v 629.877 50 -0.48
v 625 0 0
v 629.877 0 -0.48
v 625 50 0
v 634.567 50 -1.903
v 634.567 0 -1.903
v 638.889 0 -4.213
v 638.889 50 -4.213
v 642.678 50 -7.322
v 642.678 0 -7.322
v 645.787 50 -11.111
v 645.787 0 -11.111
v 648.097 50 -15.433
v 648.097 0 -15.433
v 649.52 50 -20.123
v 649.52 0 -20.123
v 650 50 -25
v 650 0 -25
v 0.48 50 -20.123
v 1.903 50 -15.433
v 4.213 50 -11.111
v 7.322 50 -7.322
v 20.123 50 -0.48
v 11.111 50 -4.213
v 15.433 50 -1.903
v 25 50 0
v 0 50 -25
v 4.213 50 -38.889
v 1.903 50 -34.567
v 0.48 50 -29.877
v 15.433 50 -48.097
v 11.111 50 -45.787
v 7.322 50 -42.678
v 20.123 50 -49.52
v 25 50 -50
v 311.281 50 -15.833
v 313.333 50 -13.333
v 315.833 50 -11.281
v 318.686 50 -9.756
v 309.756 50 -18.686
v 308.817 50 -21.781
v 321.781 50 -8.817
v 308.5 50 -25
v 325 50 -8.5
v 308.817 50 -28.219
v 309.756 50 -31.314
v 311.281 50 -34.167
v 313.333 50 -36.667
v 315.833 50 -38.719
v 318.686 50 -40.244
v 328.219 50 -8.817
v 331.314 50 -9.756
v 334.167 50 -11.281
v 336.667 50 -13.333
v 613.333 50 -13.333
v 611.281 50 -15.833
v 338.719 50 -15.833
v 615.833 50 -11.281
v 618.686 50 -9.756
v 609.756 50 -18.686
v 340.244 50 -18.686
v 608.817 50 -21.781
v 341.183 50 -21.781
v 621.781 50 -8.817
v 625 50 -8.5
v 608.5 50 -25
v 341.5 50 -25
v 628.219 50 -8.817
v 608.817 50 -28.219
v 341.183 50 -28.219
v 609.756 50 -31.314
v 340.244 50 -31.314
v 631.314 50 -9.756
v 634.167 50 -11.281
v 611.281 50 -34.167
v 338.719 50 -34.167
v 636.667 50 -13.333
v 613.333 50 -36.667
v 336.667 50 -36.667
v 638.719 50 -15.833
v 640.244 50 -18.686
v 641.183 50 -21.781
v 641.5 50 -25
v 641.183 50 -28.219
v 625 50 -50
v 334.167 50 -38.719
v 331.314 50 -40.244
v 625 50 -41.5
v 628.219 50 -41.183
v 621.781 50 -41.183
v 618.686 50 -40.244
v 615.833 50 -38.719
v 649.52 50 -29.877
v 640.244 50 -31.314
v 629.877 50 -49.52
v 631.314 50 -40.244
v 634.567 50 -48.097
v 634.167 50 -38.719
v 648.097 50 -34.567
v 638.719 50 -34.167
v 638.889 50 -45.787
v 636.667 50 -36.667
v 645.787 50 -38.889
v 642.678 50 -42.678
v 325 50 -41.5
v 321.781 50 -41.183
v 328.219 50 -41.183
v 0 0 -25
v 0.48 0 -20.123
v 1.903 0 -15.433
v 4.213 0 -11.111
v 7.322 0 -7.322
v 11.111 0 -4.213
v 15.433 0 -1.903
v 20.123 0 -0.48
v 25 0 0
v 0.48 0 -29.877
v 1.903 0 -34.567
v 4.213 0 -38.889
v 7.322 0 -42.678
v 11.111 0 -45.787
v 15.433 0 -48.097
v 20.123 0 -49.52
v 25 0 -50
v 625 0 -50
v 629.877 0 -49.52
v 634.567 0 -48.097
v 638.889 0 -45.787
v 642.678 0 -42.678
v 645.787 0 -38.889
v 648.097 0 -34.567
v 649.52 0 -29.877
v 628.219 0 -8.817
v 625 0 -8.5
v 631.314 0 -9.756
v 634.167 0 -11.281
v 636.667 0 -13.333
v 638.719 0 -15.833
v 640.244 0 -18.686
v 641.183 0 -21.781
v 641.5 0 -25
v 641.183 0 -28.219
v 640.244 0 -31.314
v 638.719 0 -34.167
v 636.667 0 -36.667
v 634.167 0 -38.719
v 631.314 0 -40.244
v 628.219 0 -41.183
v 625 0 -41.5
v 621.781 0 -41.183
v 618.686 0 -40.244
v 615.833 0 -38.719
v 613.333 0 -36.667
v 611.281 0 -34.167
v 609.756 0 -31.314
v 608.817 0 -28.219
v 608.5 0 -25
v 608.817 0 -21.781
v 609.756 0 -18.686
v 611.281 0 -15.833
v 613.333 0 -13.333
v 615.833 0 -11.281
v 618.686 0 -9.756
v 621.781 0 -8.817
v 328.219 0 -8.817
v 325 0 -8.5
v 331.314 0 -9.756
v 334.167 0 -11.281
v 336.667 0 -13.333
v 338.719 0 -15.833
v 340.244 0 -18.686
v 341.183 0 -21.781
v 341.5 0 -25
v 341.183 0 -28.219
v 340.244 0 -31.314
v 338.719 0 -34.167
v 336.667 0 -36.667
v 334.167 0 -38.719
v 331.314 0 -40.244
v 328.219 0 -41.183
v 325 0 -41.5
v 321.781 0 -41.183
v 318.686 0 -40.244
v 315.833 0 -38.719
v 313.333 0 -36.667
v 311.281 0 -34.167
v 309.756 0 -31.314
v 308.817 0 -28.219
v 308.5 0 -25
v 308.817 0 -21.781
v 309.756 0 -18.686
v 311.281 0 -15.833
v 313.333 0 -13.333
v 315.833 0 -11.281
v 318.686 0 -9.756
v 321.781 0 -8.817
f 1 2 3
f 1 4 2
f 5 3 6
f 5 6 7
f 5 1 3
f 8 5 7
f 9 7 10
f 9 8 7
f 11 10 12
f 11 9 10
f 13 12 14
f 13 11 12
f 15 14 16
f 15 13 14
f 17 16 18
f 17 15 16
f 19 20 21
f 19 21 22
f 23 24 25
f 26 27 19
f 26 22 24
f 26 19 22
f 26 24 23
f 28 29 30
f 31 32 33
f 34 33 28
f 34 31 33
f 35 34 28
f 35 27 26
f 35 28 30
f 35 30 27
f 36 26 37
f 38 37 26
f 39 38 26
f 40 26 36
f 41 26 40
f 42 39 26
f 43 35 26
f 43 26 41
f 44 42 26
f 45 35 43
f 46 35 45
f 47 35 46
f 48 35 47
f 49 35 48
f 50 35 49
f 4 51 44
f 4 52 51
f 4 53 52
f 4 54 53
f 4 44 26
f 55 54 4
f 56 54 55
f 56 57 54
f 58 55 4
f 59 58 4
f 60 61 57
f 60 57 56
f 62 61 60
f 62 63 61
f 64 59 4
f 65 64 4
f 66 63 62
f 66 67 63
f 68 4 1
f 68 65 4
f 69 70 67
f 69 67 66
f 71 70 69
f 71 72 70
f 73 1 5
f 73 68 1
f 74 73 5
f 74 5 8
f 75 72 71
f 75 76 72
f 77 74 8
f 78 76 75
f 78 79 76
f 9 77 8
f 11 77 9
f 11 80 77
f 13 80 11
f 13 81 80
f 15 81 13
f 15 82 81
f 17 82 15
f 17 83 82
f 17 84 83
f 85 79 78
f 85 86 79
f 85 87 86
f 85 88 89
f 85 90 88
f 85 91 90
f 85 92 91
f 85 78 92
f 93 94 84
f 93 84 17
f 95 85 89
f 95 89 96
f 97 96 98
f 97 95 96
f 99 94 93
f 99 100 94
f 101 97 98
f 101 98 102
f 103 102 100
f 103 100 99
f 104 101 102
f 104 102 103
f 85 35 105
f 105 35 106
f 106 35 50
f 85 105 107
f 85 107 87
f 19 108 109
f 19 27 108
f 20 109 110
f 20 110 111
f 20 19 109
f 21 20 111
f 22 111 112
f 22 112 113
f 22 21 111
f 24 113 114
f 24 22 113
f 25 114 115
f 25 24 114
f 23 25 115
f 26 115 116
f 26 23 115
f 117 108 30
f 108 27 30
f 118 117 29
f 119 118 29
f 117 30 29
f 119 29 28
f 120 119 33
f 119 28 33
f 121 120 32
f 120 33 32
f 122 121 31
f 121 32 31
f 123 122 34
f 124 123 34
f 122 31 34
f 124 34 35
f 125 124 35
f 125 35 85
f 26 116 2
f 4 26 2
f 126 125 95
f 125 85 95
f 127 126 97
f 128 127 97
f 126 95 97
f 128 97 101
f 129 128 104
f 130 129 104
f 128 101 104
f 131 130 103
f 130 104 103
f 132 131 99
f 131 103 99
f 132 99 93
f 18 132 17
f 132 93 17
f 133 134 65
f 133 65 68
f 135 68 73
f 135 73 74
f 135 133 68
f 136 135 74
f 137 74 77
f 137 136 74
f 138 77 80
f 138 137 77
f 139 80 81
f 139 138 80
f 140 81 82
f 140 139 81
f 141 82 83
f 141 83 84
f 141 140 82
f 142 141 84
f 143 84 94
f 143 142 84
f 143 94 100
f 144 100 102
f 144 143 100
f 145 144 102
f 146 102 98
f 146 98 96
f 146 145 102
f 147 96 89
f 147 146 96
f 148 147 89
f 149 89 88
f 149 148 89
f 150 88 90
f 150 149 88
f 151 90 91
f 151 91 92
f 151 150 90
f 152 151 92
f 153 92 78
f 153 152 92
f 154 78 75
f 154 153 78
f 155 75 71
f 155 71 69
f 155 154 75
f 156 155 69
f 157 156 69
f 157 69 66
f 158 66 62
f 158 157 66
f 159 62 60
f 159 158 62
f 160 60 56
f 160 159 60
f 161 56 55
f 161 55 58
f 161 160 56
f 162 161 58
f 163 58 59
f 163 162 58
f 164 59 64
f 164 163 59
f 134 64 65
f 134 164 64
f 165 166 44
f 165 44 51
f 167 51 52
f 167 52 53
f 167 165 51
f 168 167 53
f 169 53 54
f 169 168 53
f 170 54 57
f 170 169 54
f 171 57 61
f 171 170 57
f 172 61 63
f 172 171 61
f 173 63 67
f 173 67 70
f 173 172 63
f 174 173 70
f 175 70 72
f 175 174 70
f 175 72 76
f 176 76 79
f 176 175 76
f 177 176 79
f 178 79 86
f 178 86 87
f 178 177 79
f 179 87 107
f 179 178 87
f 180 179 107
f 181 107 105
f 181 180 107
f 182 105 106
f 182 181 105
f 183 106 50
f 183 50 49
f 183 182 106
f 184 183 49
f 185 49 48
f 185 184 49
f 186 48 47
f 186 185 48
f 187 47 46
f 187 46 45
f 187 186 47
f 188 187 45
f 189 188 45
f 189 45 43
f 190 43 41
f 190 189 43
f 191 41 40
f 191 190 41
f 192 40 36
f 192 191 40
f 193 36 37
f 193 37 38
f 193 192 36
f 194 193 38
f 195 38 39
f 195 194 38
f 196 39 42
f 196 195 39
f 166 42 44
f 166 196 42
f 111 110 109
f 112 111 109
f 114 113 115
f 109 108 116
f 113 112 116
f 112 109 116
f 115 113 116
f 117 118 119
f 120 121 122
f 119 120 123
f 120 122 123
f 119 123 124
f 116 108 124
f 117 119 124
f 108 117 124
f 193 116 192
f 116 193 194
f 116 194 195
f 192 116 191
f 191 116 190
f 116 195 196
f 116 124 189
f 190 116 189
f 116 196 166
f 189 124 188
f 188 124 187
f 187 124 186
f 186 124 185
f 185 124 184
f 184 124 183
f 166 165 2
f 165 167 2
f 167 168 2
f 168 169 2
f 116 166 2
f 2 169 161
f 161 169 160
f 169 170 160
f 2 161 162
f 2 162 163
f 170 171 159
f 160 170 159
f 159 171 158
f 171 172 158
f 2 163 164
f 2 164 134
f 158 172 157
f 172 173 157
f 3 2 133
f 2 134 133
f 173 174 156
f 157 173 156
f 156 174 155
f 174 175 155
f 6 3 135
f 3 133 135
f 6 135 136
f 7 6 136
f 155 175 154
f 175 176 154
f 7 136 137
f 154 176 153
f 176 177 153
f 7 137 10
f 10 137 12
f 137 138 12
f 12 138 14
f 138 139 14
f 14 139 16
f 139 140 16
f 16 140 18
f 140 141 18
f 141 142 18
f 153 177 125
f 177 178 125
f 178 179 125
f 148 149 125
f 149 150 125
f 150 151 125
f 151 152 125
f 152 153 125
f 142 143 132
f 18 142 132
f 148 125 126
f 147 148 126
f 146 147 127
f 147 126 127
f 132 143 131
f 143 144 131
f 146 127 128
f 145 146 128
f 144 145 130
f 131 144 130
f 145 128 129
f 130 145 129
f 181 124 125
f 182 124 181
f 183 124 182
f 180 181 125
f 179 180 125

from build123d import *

# Parameters (mm, degrees)
SKETCH_1_W      = 650
SKETCH_1_H      = 50
SKETCH_1_R      = 16.5
EXTRUDE_1_DEPTH = 50
FILLET_1_R      = 25


with BuildPart() as part:
    # 草图1 → 凸台-拉伸1 (new body)
    with BuildSketch(Plane(origin=(0, 0, 0), x_dir=(1, 0, 0), z_dir=(0, 1, 0))):
        with Locations((325, 25)):
            Rectangle(SKETCH_1_W, SKETCH_1_H)
        with Locations(Location((625, 25, 0), (0, 0, 270))):
            Circle(SKETCH_1_R, mode=Mode.SUBTRACT)
        with Locations(Location((325, 25, 0), (0, 0, 270))):
            Circle(SKETCH_1_R, mode=Mode.SUBTRACT)
    extrude(amount=EXTRUDE_1_DEPTH)

    # 圆角1
    fillet_1_edges = [part.edges().sort_by_distance(p)[0] for p in [
        (0, 25, -50),
        (0, 25, 0),
        (650, 25, -50),
        (650, 25, 0),
    ]]
    fillet(fillet_1_edges, radius=FILLET_1_R - 0.0001)  # a hair under: the kernel refuses the full size


solid = part.part
